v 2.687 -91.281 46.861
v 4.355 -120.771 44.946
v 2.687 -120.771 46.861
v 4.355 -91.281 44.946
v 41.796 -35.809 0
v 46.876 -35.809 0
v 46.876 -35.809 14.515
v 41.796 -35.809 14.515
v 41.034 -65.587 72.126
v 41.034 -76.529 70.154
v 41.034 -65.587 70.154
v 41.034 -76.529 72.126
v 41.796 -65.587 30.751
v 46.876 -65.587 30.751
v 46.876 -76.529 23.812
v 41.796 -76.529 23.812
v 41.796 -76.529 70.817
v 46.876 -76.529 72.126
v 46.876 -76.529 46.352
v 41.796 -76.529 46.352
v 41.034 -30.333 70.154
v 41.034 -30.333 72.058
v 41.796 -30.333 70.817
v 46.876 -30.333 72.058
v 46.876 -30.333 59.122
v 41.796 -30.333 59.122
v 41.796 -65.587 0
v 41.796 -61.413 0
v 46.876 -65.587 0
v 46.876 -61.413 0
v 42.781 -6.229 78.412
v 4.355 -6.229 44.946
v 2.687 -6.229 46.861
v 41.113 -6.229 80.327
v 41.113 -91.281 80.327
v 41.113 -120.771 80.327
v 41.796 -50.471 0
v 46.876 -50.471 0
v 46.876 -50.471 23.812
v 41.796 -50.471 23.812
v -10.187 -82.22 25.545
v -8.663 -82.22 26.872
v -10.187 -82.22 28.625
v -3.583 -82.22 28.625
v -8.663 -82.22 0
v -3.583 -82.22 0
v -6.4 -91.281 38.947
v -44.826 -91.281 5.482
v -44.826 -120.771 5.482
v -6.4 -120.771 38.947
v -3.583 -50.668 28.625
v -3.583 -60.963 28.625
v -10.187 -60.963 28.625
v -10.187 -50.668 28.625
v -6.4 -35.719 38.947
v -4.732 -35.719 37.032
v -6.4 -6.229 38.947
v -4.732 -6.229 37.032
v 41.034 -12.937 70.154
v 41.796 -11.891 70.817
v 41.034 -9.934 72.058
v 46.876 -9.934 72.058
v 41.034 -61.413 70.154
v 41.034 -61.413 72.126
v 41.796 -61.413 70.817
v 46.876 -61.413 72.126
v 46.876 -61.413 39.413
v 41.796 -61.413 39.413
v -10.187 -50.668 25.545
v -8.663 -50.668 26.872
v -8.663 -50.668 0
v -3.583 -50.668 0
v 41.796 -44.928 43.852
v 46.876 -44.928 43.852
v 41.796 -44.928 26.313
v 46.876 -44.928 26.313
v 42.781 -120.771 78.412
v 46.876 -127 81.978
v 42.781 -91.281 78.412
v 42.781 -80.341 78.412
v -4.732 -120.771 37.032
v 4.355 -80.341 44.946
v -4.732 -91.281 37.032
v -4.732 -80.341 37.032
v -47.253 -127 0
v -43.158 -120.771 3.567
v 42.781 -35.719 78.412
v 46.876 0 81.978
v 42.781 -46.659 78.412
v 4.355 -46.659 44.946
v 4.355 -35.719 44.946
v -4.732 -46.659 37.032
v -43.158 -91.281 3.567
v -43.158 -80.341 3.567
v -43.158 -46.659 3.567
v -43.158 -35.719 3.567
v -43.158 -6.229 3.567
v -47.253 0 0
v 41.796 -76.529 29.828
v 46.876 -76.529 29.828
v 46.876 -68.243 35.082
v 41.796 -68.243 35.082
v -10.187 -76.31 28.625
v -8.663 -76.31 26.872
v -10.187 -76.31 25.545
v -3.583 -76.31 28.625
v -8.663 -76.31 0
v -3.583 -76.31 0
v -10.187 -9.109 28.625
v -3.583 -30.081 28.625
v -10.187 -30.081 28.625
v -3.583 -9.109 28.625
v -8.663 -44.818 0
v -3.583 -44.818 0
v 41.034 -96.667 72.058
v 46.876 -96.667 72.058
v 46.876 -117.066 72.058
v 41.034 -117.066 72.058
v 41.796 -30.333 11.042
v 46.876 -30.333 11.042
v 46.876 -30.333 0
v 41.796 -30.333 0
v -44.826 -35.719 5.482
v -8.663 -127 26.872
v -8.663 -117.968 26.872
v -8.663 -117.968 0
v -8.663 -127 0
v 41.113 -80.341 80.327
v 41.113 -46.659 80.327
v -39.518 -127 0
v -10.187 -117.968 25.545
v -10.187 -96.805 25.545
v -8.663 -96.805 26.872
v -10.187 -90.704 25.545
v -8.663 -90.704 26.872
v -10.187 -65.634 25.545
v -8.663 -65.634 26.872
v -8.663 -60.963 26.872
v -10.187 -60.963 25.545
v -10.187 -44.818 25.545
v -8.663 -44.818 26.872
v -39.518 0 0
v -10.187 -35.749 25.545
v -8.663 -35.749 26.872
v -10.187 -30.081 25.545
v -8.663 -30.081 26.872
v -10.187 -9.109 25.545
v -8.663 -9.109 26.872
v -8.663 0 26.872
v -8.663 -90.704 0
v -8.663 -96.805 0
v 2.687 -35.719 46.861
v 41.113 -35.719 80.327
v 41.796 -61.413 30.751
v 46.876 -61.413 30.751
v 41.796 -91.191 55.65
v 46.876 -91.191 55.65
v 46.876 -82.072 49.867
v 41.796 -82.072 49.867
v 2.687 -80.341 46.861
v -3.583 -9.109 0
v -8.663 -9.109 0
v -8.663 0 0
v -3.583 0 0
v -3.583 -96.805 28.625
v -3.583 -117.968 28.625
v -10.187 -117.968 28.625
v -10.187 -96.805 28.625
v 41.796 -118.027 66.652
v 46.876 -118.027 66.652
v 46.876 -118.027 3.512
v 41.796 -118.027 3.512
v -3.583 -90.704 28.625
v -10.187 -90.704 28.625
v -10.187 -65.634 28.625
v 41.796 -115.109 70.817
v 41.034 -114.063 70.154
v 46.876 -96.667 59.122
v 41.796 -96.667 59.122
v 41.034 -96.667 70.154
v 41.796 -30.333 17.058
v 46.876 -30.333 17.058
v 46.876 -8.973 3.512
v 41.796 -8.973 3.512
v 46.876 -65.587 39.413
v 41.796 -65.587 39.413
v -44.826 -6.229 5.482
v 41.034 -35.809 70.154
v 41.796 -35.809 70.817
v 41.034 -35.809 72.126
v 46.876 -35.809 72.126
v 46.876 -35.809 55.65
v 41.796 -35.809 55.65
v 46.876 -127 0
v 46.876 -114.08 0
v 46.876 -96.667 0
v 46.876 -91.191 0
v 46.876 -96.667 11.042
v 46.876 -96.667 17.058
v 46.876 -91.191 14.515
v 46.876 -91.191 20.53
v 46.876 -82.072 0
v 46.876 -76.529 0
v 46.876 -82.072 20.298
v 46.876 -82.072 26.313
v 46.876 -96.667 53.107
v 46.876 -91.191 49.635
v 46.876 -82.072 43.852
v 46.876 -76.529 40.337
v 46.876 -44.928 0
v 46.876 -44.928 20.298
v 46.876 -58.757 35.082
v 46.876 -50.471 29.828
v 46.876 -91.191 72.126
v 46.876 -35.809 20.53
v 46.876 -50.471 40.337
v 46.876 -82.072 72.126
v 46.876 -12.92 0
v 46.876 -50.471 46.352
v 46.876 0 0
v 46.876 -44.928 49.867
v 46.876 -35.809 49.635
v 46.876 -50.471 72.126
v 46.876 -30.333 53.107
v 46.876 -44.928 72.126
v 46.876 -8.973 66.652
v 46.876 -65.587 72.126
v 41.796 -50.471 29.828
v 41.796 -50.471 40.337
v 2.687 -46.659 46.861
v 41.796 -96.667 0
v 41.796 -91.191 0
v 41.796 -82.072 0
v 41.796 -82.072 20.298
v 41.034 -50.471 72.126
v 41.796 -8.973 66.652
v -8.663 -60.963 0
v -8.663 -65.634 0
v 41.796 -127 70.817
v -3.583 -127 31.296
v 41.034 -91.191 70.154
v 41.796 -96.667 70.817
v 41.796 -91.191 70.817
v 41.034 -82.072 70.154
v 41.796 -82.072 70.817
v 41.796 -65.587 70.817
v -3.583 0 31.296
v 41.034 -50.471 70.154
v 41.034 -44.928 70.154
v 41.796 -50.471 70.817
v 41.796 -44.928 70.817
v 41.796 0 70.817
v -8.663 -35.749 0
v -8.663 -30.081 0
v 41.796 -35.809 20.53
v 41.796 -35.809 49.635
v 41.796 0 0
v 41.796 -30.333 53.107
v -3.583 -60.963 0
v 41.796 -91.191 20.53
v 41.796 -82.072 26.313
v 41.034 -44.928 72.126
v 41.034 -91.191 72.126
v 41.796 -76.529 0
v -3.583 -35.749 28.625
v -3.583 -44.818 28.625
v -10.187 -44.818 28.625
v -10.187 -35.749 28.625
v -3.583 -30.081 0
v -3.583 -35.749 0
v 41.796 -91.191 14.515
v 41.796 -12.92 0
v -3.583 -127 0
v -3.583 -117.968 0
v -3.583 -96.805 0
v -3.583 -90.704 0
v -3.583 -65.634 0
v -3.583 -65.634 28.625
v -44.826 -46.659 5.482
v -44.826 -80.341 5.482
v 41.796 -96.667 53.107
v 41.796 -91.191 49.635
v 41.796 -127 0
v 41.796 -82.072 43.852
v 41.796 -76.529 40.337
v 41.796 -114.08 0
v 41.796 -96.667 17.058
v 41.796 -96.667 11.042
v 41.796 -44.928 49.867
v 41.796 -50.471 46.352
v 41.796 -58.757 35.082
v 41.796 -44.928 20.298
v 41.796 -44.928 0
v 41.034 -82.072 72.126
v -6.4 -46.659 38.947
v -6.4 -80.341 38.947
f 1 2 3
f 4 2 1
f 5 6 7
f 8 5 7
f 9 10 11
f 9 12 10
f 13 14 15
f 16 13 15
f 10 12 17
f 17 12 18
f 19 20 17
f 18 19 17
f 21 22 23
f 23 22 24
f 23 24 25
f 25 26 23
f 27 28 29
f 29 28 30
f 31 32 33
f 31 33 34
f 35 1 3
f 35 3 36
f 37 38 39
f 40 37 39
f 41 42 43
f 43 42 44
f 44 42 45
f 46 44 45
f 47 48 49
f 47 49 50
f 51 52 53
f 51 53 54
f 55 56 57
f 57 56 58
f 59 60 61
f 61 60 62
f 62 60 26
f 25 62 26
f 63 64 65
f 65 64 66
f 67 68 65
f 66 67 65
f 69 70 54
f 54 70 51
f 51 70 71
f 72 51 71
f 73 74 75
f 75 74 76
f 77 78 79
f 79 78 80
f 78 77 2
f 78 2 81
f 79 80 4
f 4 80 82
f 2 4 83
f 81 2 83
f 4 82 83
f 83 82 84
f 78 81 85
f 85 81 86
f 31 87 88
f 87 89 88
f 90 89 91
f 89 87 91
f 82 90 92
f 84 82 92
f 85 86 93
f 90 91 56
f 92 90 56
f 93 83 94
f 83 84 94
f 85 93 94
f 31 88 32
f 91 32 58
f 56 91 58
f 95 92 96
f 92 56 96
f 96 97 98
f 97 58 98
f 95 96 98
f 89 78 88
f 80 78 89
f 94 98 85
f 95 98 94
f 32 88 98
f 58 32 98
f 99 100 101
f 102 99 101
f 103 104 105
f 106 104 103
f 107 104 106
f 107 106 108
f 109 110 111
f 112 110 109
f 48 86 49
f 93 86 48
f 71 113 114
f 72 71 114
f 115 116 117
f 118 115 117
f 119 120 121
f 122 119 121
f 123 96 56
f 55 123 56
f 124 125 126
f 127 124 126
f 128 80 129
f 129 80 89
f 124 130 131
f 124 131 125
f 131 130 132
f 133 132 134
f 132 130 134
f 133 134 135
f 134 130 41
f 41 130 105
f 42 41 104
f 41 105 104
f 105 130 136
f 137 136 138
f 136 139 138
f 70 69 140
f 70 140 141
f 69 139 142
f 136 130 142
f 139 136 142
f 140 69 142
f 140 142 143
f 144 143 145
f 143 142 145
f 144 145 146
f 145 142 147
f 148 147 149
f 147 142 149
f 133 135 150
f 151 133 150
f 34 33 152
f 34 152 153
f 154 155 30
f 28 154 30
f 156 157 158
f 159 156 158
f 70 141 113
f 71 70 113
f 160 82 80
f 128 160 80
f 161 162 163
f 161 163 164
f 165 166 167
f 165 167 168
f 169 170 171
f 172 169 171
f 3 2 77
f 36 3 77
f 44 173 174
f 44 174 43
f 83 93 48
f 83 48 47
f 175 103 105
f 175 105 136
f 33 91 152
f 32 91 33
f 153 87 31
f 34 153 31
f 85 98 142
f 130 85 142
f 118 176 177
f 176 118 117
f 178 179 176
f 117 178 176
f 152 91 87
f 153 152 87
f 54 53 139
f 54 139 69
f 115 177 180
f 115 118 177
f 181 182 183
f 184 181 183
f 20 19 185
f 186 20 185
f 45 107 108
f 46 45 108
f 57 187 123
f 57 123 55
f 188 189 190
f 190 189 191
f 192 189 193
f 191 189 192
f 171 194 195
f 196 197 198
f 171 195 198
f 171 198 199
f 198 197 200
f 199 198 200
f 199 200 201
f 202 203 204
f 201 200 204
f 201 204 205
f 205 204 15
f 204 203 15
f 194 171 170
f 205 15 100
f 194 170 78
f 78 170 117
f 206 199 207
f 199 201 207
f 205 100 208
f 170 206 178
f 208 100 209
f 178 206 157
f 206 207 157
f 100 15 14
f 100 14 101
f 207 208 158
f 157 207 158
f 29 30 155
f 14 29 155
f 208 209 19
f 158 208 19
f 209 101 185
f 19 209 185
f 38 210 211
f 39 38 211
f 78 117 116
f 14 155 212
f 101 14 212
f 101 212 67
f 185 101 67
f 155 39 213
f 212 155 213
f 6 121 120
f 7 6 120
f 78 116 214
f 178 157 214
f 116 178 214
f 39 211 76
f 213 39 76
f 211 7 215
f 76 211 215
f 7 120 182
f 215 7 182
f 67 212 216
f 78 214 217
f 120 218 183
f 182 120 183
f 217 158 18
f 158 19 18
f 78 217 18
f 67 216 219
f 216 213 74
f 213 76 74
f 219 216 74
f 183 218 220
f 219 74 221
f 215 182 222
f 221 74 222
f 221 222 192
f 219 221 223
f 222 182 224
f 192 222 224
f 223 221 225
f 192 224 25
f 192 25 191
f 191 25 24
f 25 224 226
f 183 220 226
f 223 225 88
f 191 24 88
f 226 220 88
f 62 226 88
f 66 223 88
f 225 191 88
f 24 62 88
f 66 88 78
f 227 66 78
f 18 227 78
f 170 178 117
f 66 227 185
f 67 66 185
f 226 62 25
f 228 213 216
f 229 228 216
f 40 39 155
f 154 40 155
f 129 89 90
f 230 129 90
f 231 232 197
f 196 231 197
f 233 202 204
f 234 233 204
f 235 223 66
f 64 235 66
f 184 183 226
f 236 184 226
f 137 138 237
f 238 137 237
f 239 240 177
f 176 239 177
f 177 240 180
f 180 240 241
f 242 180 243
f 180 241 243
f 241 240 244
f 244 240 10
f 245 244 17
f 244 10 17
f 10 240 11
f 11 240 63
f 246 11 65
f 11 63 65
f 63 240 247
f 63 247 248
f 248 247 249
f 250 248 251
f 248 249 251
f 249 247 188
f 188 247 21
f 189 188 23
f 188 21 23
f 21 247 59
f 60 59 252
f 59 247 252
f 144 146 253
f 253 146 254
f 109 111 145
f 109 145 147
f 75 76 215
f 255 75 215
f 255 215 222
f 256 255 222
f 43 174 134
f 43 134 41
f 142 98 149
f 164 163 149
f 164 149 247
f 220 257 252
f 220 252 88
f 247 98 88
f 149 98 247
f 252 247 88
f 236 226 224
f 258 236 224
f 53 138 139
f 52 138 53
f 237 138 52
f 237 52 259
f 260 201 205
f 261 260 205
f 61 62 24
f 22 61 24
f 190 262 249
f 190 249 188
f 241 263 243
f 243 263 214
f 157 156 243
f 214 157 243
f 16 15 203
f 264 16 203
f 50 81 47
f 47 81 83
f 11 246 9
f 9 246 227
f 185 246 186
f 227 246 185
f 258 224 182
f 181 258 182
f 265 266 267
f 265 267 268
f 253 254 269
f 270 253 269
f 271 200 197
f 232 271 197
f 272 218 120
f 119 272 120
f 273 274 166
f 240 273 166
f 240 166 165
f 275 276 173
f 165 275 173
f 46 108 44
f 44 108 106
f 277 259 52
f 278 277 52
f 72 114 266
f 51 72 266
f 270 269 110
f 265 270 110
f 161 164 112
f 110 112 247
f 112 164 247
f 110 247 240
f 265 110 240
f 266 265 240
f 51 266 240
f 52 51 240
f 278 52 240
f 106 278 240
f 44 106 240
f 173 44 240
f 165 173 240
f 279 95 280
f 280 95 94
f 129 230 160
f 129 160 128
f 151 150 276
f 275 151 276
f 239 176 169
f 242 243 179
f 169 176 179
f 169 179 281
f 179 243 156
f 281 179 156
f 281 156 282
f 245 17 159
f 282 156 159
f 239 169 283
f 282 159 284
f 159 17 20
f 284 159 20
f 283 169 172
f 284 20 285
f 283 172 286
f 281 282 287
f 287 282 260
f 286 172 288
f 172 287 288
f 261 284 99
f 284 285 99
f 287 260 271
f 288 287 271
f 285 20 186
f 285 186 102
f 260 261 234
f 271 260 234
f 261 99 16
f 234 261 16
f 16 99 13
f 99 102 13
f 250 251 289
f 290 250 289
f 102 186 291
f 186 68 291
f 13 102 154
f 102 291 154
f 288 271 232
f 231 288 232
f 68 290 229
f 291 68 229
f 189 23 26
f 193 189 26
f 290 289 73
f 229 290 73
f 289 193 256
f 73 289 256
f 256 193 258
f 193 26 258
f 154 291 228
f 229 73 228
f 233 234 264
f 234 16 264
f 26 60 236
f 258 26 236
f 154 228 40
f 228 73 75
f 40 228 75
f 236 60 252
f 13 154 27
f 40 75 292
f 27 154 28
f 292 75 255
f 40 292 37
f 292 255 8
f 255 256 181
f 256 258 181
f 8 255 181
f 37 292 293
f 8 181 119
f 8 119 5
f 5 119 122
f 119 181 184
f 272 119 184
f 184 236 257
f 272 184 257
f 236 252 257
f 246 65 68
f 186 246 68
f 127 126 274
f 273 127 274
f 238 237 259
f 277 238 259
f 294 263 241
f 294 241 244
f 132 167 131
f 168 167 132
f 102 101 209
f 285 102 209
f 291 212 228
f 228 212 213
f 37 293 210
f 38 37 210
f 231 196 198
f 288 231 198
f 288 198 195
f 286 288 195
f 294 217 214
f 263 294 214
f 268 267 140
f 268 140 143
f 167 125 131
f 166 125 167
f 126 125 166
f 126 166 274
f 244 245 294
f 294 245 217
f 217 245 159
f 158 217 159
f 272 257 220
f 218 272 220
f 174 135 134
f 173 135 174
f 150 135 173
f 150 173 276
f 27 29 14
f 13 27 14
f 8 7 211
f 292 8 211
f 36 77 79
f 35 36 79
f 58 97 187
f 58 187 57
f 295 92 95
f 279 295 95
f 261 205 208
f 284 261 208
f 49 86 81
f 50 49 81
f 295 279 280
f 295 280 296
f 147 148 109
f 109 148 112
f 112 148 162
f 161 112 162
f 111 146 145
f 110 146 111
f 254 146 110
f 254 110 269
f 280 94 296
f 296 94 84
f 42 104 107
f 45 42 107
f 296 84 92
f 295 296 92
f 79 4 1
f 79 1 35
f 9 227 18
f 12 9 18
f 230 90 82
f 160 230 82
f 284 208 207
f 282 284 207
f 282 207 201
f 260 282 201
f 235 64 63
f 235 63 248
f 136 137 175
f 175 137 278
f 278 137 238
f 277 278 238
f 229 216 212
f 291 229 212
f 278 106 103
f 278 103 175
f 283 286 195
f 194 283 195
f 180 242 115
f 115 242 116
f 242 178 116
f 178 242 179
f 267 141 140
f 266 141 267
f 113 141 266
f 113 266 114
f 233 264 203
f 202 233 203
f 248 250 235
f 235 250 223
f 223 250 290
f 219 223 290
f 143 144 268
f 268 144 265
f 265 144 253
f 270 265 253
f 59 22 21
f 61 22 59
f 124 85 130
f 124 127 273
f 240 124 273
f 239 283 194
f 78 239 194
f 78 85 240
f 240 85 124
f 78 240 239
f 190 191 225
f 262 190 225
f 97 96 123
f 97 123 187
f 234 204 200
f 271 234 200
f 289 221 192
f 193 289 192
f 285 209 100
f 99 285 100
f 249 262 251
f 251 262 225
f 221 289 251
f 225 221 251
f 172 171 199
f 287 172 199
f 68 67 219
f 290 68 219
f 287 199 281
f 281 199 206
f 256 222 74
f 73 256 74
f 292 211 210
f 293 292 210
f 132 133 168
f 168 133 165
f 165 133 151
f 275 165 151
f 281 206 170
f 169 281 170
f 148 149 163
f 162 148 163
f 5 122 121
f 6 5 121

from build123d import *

# Parameters (mm, degrees)
F1_DEPTH = 127
F3_DEPTH = 5.842
F5_W     = 21.162301302
F5_H     = 28.62467058
F5_W_2   = 8.4839835763
F5_W_3   = 10.6764808297
F5_W_4   = 10.2951750159
F5_W_5   = 9.0689621866
F5_W_6   = 20.9719697013
F6_DEPTH = 6.604
F7_W     = 50.9557463229
F7_H     = 29.4899502769
F8_DEPTH = 2.54


with BuildPart() as f1:
    # F0 (on Front) → F1 (new body)
    with BuildSketch(Plane.XZ):
        Polygon((46.8764491379, 81.9781199098), (-47.2529642284, 0), (-39.5179688628, 0), (-8.6630821907, 26.8717875629), (-8.6630821907, 0), (-3.5830821907, 0), (-3.5830821907, 31.2960034828), (41.7964491379, 70.817429652), (41.7964491379, 0), (46.8764491379, 0), align=None)
    extrude(amount=F1_DEPTH)

    # F2 (on face) → F3 (cut)
    with BuildSketch(Plane.YZ.offset(46.8764491379)):
        Polygon((-50.4709516168, 40.3369802166), (-58.757108451, 35.0823956511), (-50.4709516168, 29.8278110855), align=None)
        Polygon((-35.8090658188, 49.6346703711), (-44.928032577, 43.8519676127), (-44.928032577, 26.3128236894), (-35.8090658188, 20.530120931), align=None)
        Polygon((-30.3332541585, 17.0576890172), (-8.9731920958, 3.5124165006), (-8.9731920958, 66.6523748015), (-30.3332541585, 53.107102285), align=None)
        Polygon((-30.3332541585, 0), (-12.9201102982, 0), (-30.3332541585, 11.0423732976), align=None)
        Polygon((-44.928032577, 0), (-35.8090658188, 0), (-35.8090658188, 14.5148052115), (-44.928032577, 20.2975079699), align=None)
        Polygon((-61.4131574035, 30.7513871575), (-61.4131574035, 0), (-50.4709516168, 0), (-50.4709516168, 23.812495366), align=None)
        Polygon((-76.5290483832, 23.812495366), (-76.5290483832, 0), (-65.5868425965, 0), (-65.5868425965, 30.7513871575), align=None)
        Polygon((-91.1909341812, 14.5148052115), (-91.1909341812, 0), (-82.071967423, 0), (-82.071967423, 20.2975079699), align=None)
        Polygon((-96.6667458415, 11.0423732976), (-114.0798897018, 0), (-96.6667458415, 0), align=None)
        Polygon((-118.0268079042, 66.6523748015), (-118.0268079042, 3.5124165006), (-96.6667458415, 17.0576890172), (-96.6667458415, 53.107102285), align=None)
        Polygon((-82.071967423, 43.8519676127), (-91.1909341812, 49.6346703711), (-91.1909341812, 20.530120931), (-82.071967423, 26.3128236894), align=None)
        Polygon((-68.242891549, 35.0823956511), (-76.5290483832, 40.3369802166), (-76.5290483832, 29.8278110855), align=None)
        Polygon((-65.5868425965, 39.4134041447), (-65.5868425965, 72.1255466342), (-76.5290483832, 72.1255466342), (-76.5290483832, 46.3522959362), align=None)
        Polygon((-96.6667458415, 72.0583349466), (-117.0658916235, 72.0583349466), (-96.6667458415, 59.1224180045), align=None)
        Polygon((-82.071967423, 72.1255466342), (-91.1909341812, 72.1255466342), (-91.1909341812, 55.6499860907), (-82.071967423, 49.8672833323), align=None)
        Polygon((-50.4709516168, 72.1255466342), (-61.4131574035, 72.1255466342), (-61.4131574035, 39.4134041447), (-50.4709516168, 46.3522959362), align=None)
        Polygon((-35.8090658188, 72.1255466342), (-44.928032577, 72.1255466342), (-44.928032577, 49.8672833323), (-35.8090658188, 55.6499860907), align=None)
        Polygon((-30.3332541585, 59.1224180045), (-9.9341083765, 72.0583349466), (-30.3332541585, 72.0583349466), align=None)
    extrude(amount=-F3_DEPTH, mode=Mode.SUBTRACT)

    # F5 (on face) → F6 (cut)
    with BuildSketch(Plane.YZ.offset(-3.5830821907)):
        with Locations((-107.3864251375, 14.31233529)):
            Rectangle(F5_W, F5_H)
        with Locations((-86.4624343812, 14.31233529)):
            Rectangle(F5_W_2, F5_H)
        with Locations((-70.972006768, 14.31233529)):
            Rectangle(F5_W_3, F5_H)
        with Locations((-55.8152236044, 14.31233529)):
            Rectangle(F5_W_4, F5_H)
        with Locations((-40.2838084847, 14.31233529)):
            Rectangle(F5_W_5, F5_H)
        with Locations((-19.5952425711, 14.31233529)):
            Rectangle(F5_W_6, F5_H)
    extrude(amount=-F6_DEPTH, mode=Mode.SUBTRACT)

    # F7 (on face) → F8 (join)
    with BuildSketch(Plane(origin=(-20.3815104704, 0, 23.4025813987), x_dir=(0.7541036669, 0, 0.6567554032), z_dir=(-0.6567554032, 0, 0.7541036669))):
        with Locations((58.2807790488, -20.9741364233)):
            Rectangle(F7_W, F7_H)
        Polygon((83.7586522102, -63.5), (83.7586522102, -46.6593503952), (32.8029058874, -46.6593503952), (32.8029058874, -63.5), (32.8029058874, -80.3406496048), (83.7586522102, -80.3406496048), align=None)
        with Locations((58.2807790488, -106.0258635767)):
            Rectangle(F7_W, F7_H)
        with Locations((-4.7251372654, -106.0258635767)):
            Rectangle(F7_W, F7_H)
        Polygon((-30.2030104268, -46.6593503952), (-30.2030104268, -63.5), (-30.2030104268, -80.3406496048), (20.752735896, -80.3406496048), (20.752735896, -63.5), (20.752735896, -46.6593503952), align=None)
        with Locations((-4.7251372654, -20.9741364233)):
            Rectangle(F7_W, F7_H)
    extrude(amount=F8_DEPTH)


solid = f1.part
